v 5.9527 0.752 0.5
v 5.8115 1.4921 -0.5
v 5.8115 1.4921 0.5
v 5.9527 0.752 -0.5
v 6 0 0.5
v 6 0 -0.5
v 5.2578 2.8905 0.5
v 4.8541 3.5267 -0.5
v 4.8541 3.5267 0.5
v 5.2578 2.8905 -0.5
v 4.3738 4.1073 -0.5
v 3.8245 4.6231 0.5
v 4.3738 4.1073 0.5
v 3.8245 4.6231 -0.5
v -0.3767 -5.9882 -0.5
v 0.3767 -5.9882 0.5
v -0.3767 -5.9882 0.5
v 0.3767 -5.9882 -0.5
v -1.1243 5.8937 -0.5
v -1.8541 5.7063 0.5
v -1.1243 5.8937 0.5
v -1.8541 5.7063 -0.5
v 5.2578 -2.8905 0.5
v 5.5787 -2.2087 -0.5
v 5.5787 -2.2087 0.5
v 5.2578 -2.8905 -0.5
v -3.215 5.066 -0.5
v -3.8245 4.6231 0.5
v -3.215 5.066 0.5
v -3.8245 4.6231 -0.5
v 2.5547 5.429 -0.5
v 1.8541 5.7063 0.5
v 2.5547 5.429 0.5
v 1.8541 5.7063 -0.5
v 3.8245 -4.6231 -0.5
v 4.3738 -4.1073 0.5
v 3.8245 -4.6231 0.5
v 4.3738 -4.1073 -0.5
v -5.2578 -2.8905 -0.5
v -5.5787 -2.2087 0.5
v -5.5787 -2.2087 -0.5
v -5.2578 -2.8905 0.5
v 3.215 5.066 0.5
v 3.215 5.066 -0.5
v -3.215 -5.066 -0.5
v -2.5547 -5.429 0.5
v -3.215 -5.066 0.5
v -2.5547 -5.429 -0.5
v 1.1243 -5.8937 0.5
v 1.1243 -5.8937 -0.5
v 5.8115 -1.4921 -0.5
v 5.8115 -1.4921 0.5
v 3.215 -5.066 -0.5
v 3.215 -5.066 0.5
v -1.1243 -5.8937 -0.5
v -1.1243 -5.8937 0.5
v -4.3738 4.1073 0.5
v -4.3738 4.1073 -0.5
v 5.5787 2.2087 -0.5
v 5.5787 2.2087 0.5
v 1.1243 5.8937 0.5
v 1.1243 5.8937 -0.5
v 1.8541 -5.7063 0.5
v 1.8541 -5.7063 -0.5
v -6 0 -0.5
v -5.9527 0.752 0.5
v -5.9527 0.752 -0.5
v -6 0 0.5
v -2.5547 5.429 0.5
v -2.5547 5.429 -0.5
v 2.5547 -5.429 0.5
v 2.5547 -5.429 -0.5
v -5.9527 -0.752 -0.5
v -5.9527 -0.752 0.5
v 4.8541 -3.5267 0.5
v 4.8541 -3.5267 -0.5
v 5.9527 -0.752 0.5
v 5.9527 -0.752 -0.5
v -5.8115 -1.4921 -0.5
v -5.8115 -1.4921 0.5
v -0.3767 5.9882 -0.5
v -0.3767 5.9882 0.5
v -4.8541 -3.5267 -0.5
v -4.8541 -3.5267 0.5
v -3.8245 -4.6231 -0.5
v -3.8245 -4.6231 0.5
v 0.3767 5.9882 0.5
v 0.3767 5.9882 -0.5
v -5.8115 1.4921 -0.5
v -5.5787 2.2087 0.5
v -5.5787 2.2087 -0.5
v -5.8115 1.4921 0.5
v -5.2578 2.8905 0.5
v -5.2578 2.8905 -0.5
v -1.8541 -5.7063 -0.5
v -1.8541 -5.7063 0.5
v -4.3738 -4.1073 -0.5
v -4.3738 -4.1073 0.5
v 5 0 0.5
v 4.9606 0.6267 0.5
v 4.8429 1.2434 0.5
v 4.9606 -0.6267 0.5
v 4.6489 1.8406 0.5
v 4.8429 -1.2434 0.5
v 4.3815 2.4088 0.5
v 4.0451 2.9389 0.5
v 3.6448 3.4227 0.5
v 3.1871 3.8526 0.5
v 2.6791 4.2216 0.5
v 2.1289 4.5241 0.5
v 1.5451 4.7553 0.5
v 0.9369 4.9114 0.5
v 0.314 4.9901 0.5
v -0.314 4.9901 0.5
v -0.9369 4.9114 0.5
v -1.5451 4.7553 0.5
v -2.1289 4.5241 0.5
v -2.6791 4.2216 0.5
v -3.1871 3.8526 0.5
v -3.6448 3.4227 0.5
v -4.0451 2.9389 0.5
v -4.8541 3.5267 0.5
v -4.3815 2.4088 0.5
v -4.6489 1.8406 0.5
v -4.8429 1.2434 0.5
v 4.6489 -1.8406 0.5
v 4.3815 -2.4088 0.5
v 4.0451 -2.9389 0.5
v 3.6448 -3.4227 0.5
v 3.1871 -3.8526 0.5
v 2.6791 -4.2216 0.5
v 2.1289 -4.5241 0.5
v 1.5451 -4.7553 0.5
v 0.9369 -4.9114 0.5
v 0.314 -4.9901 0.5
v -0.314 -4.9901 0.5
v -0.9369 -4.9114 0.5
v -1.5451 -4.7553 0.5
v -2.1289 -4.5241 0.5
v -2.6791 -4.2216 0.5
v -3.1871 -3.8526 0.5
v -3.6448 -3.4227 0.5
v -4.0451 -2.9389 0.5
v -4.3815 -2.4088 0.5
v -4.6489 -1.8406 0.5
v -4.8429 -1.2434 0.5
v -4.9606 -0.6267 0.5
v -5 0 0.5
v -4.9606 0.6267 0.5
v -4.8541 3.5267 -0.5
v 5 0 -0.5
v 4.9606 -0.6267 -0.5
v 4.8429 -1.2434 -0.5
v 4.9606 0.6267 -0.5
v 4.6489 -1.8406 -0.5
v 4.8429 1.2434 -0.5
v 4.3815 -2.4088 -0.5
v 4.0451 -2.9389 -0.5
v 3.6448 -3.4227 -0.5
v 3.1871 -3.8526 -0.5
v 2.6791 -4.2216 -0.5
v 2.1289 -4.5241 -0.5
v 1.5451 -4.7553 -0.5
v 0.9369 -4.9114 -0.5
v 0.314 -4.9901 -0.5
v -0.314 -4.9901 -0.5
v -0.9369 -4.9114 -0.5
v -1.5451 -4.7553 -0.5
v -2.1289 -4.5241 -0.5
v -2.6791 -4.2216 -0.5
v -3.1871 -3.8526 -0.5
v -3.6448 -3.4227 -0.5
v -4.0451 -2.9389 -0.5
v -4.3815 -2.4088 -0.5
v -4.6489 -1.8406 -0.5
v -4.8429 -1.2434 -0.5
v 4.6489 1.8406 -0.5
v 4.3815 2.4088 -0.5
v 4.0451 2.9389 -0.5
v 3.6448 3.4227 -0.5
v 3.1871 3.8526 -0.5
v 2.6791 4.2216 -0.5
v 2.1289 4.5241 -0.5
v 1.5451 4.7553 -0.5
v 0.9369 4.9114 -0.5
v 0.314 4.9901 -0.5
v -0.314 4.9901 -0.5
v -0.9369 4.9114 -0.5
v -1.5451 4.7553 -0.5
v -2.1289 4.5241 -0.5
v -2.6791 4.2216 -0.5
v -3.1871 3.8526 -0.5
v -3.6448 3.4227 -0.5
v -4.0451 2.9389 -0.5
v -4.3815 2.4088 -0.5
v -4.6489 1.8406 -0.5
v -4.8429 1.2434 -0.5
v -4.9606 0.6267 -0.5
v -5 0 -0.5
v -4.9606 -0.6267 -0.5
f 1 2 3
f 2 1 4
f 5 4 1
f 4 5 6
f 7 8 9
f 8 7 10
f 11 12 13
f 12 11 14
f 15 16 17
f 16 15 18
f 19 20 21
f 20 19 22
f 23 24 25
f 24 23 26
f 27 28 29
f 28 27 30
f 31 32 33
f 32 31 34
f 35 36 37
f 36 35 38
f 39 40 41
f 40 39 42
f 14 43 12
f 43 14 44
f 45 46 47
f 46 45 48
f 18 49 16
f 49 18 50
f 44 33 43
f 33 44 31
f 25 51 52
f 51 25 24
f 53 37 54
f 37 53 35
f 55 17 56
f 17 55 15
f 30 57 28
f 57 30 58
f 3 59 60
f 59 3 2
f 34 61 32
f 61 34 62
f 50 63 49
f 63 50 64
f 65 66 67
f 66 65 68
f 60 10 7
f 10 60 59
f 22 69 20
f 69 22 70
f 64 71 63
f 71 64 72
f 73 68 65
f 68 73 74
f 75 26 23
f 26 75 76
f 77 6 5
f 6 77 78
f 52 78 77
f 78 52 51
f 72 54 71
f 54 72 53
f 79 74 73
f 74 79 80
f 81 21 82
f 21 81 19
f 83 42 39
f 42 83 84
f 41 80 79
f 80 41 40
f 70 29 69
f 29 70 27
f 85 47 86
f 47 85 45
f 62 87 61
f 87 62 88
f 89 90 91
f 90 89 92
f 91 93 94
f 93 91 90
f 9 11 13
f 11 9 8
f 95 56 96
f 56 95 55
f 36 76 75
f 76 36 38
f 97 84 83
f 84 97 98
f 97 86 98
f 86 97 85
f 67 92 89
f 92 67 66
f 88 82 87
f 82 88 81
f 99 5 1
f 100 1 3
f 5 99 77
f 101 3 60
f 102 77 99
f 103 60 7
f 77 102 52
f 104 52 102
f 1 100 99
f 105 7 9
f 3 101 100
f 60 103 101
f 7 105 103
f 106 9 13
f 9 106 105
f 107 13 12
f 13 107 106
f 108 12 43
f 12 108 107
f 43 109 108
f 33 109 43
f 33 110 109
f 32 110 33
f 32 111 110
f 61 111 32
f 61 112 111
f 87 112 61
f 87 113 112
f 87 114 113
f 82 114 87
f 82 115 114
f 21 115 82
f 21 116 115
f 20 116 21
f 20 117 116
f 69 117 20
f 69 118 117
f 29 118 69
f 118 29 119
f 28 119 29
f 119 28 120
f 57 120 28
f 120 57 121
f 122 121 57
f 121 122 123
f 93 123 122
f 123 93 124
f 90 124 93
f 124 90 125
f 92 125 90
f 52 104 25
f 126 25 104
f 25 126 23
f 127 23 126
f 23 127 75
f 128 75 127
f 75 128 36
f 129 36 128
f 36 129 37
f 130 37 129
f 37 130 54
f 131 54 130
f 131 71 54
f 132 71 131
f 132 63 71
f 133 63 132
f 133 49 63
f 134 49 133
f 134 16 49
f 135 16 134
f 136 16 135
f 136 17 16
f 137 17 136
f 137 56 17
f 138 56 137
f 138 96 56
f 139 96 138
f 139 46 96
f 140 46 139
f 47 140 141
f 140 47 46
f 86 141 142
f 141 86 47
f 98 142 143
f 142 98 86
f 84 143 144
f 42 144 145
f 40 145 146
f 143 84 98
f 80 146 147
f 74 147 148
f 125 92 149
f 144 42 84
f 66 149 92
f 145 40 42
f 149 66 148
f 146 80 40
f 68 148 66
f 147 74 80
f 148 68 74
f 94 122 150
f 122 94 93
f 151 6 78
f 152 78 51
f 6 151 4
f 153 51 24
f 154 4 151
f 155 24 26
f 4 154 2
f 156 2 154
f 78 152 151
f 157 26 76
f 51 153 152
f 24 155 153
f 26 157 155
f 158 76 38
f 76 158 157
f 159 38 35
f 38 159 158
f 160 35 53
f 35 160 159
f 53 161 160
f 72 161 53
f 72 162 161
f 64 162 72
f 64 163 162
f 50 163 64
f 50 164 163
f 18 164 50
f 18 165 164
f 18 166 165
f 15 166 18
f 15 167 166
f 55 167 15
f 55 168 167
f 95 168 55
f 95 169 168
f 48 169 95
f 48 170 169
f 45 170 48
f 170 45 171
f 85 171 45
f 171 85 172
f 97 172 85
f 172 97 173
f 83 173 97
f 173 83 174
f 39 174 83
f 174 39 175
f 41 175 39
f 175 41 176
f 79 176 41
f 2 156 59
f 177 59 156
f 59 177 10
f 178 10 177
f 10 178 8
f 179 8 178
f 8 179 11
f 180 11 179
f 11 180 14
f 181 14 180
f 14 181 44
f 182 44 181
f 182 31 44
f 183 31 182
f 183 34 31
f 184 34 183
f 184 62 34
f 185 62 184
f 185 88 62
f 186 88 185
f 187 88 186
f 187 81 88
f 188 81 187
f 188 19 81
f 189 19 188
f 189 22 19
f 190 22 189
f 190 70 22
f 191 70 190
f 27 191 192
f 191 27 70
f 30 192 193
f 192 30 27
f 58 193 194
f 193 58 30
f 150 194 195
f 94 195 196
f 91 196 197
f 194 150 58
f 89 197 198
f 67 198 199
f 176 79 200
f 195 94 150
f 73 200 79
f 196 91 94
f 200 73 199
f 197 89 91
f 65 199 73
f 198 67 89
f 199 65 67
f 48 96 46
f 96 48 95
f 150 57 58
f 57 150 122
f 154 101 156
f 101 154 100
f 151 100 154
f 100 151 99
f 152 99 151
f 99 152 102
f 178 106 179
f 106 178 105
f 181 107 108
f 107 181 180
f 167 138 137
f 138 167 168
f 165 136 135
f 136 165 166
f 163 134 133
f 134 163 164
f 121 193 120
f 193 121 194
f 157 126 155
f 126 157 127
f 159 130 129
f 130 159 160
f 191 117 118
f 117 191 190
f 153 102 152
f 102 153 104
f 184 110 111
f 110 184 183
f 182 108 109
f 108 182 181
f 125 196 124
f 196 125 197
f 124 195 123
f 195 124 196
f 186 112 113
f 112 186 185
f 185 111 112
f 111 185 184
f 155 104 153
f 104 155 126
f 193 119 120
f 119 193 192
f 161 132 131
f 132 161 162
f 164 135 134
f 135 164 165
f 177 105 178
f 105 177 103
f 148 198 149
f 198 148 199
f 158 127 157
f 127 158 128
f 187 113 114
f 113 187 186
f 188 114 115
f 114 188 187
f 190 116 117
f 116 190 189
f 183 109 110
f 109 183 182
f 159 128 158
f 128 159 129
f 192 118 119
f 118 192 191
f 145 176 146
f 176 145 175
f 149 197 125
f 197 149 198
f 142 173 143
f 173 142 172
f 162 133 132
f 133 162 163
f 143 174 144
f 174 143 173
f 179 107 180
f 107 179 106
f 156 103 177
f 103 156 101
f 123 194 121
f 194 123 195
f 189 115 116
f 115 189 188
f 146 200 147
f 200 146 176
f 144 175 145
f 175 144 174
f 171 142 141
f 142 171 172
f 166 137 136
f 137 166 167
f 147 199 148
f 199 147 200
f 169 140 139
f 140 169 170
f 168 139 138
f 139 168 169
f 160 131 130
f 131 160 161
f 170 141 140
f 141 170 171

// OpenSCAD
$fn = 50;


difference() {
	union() {
		translate(v = [0, 0, -0.5000000000]) {
			cylinder(h = 1, r = 6.0000000000);
		}
	}
	union() {
		translate(v = [0, 0, -100.0000000000]) {
			cylinder(h = 200, r = 5.0000000000);
		}
	}
}
